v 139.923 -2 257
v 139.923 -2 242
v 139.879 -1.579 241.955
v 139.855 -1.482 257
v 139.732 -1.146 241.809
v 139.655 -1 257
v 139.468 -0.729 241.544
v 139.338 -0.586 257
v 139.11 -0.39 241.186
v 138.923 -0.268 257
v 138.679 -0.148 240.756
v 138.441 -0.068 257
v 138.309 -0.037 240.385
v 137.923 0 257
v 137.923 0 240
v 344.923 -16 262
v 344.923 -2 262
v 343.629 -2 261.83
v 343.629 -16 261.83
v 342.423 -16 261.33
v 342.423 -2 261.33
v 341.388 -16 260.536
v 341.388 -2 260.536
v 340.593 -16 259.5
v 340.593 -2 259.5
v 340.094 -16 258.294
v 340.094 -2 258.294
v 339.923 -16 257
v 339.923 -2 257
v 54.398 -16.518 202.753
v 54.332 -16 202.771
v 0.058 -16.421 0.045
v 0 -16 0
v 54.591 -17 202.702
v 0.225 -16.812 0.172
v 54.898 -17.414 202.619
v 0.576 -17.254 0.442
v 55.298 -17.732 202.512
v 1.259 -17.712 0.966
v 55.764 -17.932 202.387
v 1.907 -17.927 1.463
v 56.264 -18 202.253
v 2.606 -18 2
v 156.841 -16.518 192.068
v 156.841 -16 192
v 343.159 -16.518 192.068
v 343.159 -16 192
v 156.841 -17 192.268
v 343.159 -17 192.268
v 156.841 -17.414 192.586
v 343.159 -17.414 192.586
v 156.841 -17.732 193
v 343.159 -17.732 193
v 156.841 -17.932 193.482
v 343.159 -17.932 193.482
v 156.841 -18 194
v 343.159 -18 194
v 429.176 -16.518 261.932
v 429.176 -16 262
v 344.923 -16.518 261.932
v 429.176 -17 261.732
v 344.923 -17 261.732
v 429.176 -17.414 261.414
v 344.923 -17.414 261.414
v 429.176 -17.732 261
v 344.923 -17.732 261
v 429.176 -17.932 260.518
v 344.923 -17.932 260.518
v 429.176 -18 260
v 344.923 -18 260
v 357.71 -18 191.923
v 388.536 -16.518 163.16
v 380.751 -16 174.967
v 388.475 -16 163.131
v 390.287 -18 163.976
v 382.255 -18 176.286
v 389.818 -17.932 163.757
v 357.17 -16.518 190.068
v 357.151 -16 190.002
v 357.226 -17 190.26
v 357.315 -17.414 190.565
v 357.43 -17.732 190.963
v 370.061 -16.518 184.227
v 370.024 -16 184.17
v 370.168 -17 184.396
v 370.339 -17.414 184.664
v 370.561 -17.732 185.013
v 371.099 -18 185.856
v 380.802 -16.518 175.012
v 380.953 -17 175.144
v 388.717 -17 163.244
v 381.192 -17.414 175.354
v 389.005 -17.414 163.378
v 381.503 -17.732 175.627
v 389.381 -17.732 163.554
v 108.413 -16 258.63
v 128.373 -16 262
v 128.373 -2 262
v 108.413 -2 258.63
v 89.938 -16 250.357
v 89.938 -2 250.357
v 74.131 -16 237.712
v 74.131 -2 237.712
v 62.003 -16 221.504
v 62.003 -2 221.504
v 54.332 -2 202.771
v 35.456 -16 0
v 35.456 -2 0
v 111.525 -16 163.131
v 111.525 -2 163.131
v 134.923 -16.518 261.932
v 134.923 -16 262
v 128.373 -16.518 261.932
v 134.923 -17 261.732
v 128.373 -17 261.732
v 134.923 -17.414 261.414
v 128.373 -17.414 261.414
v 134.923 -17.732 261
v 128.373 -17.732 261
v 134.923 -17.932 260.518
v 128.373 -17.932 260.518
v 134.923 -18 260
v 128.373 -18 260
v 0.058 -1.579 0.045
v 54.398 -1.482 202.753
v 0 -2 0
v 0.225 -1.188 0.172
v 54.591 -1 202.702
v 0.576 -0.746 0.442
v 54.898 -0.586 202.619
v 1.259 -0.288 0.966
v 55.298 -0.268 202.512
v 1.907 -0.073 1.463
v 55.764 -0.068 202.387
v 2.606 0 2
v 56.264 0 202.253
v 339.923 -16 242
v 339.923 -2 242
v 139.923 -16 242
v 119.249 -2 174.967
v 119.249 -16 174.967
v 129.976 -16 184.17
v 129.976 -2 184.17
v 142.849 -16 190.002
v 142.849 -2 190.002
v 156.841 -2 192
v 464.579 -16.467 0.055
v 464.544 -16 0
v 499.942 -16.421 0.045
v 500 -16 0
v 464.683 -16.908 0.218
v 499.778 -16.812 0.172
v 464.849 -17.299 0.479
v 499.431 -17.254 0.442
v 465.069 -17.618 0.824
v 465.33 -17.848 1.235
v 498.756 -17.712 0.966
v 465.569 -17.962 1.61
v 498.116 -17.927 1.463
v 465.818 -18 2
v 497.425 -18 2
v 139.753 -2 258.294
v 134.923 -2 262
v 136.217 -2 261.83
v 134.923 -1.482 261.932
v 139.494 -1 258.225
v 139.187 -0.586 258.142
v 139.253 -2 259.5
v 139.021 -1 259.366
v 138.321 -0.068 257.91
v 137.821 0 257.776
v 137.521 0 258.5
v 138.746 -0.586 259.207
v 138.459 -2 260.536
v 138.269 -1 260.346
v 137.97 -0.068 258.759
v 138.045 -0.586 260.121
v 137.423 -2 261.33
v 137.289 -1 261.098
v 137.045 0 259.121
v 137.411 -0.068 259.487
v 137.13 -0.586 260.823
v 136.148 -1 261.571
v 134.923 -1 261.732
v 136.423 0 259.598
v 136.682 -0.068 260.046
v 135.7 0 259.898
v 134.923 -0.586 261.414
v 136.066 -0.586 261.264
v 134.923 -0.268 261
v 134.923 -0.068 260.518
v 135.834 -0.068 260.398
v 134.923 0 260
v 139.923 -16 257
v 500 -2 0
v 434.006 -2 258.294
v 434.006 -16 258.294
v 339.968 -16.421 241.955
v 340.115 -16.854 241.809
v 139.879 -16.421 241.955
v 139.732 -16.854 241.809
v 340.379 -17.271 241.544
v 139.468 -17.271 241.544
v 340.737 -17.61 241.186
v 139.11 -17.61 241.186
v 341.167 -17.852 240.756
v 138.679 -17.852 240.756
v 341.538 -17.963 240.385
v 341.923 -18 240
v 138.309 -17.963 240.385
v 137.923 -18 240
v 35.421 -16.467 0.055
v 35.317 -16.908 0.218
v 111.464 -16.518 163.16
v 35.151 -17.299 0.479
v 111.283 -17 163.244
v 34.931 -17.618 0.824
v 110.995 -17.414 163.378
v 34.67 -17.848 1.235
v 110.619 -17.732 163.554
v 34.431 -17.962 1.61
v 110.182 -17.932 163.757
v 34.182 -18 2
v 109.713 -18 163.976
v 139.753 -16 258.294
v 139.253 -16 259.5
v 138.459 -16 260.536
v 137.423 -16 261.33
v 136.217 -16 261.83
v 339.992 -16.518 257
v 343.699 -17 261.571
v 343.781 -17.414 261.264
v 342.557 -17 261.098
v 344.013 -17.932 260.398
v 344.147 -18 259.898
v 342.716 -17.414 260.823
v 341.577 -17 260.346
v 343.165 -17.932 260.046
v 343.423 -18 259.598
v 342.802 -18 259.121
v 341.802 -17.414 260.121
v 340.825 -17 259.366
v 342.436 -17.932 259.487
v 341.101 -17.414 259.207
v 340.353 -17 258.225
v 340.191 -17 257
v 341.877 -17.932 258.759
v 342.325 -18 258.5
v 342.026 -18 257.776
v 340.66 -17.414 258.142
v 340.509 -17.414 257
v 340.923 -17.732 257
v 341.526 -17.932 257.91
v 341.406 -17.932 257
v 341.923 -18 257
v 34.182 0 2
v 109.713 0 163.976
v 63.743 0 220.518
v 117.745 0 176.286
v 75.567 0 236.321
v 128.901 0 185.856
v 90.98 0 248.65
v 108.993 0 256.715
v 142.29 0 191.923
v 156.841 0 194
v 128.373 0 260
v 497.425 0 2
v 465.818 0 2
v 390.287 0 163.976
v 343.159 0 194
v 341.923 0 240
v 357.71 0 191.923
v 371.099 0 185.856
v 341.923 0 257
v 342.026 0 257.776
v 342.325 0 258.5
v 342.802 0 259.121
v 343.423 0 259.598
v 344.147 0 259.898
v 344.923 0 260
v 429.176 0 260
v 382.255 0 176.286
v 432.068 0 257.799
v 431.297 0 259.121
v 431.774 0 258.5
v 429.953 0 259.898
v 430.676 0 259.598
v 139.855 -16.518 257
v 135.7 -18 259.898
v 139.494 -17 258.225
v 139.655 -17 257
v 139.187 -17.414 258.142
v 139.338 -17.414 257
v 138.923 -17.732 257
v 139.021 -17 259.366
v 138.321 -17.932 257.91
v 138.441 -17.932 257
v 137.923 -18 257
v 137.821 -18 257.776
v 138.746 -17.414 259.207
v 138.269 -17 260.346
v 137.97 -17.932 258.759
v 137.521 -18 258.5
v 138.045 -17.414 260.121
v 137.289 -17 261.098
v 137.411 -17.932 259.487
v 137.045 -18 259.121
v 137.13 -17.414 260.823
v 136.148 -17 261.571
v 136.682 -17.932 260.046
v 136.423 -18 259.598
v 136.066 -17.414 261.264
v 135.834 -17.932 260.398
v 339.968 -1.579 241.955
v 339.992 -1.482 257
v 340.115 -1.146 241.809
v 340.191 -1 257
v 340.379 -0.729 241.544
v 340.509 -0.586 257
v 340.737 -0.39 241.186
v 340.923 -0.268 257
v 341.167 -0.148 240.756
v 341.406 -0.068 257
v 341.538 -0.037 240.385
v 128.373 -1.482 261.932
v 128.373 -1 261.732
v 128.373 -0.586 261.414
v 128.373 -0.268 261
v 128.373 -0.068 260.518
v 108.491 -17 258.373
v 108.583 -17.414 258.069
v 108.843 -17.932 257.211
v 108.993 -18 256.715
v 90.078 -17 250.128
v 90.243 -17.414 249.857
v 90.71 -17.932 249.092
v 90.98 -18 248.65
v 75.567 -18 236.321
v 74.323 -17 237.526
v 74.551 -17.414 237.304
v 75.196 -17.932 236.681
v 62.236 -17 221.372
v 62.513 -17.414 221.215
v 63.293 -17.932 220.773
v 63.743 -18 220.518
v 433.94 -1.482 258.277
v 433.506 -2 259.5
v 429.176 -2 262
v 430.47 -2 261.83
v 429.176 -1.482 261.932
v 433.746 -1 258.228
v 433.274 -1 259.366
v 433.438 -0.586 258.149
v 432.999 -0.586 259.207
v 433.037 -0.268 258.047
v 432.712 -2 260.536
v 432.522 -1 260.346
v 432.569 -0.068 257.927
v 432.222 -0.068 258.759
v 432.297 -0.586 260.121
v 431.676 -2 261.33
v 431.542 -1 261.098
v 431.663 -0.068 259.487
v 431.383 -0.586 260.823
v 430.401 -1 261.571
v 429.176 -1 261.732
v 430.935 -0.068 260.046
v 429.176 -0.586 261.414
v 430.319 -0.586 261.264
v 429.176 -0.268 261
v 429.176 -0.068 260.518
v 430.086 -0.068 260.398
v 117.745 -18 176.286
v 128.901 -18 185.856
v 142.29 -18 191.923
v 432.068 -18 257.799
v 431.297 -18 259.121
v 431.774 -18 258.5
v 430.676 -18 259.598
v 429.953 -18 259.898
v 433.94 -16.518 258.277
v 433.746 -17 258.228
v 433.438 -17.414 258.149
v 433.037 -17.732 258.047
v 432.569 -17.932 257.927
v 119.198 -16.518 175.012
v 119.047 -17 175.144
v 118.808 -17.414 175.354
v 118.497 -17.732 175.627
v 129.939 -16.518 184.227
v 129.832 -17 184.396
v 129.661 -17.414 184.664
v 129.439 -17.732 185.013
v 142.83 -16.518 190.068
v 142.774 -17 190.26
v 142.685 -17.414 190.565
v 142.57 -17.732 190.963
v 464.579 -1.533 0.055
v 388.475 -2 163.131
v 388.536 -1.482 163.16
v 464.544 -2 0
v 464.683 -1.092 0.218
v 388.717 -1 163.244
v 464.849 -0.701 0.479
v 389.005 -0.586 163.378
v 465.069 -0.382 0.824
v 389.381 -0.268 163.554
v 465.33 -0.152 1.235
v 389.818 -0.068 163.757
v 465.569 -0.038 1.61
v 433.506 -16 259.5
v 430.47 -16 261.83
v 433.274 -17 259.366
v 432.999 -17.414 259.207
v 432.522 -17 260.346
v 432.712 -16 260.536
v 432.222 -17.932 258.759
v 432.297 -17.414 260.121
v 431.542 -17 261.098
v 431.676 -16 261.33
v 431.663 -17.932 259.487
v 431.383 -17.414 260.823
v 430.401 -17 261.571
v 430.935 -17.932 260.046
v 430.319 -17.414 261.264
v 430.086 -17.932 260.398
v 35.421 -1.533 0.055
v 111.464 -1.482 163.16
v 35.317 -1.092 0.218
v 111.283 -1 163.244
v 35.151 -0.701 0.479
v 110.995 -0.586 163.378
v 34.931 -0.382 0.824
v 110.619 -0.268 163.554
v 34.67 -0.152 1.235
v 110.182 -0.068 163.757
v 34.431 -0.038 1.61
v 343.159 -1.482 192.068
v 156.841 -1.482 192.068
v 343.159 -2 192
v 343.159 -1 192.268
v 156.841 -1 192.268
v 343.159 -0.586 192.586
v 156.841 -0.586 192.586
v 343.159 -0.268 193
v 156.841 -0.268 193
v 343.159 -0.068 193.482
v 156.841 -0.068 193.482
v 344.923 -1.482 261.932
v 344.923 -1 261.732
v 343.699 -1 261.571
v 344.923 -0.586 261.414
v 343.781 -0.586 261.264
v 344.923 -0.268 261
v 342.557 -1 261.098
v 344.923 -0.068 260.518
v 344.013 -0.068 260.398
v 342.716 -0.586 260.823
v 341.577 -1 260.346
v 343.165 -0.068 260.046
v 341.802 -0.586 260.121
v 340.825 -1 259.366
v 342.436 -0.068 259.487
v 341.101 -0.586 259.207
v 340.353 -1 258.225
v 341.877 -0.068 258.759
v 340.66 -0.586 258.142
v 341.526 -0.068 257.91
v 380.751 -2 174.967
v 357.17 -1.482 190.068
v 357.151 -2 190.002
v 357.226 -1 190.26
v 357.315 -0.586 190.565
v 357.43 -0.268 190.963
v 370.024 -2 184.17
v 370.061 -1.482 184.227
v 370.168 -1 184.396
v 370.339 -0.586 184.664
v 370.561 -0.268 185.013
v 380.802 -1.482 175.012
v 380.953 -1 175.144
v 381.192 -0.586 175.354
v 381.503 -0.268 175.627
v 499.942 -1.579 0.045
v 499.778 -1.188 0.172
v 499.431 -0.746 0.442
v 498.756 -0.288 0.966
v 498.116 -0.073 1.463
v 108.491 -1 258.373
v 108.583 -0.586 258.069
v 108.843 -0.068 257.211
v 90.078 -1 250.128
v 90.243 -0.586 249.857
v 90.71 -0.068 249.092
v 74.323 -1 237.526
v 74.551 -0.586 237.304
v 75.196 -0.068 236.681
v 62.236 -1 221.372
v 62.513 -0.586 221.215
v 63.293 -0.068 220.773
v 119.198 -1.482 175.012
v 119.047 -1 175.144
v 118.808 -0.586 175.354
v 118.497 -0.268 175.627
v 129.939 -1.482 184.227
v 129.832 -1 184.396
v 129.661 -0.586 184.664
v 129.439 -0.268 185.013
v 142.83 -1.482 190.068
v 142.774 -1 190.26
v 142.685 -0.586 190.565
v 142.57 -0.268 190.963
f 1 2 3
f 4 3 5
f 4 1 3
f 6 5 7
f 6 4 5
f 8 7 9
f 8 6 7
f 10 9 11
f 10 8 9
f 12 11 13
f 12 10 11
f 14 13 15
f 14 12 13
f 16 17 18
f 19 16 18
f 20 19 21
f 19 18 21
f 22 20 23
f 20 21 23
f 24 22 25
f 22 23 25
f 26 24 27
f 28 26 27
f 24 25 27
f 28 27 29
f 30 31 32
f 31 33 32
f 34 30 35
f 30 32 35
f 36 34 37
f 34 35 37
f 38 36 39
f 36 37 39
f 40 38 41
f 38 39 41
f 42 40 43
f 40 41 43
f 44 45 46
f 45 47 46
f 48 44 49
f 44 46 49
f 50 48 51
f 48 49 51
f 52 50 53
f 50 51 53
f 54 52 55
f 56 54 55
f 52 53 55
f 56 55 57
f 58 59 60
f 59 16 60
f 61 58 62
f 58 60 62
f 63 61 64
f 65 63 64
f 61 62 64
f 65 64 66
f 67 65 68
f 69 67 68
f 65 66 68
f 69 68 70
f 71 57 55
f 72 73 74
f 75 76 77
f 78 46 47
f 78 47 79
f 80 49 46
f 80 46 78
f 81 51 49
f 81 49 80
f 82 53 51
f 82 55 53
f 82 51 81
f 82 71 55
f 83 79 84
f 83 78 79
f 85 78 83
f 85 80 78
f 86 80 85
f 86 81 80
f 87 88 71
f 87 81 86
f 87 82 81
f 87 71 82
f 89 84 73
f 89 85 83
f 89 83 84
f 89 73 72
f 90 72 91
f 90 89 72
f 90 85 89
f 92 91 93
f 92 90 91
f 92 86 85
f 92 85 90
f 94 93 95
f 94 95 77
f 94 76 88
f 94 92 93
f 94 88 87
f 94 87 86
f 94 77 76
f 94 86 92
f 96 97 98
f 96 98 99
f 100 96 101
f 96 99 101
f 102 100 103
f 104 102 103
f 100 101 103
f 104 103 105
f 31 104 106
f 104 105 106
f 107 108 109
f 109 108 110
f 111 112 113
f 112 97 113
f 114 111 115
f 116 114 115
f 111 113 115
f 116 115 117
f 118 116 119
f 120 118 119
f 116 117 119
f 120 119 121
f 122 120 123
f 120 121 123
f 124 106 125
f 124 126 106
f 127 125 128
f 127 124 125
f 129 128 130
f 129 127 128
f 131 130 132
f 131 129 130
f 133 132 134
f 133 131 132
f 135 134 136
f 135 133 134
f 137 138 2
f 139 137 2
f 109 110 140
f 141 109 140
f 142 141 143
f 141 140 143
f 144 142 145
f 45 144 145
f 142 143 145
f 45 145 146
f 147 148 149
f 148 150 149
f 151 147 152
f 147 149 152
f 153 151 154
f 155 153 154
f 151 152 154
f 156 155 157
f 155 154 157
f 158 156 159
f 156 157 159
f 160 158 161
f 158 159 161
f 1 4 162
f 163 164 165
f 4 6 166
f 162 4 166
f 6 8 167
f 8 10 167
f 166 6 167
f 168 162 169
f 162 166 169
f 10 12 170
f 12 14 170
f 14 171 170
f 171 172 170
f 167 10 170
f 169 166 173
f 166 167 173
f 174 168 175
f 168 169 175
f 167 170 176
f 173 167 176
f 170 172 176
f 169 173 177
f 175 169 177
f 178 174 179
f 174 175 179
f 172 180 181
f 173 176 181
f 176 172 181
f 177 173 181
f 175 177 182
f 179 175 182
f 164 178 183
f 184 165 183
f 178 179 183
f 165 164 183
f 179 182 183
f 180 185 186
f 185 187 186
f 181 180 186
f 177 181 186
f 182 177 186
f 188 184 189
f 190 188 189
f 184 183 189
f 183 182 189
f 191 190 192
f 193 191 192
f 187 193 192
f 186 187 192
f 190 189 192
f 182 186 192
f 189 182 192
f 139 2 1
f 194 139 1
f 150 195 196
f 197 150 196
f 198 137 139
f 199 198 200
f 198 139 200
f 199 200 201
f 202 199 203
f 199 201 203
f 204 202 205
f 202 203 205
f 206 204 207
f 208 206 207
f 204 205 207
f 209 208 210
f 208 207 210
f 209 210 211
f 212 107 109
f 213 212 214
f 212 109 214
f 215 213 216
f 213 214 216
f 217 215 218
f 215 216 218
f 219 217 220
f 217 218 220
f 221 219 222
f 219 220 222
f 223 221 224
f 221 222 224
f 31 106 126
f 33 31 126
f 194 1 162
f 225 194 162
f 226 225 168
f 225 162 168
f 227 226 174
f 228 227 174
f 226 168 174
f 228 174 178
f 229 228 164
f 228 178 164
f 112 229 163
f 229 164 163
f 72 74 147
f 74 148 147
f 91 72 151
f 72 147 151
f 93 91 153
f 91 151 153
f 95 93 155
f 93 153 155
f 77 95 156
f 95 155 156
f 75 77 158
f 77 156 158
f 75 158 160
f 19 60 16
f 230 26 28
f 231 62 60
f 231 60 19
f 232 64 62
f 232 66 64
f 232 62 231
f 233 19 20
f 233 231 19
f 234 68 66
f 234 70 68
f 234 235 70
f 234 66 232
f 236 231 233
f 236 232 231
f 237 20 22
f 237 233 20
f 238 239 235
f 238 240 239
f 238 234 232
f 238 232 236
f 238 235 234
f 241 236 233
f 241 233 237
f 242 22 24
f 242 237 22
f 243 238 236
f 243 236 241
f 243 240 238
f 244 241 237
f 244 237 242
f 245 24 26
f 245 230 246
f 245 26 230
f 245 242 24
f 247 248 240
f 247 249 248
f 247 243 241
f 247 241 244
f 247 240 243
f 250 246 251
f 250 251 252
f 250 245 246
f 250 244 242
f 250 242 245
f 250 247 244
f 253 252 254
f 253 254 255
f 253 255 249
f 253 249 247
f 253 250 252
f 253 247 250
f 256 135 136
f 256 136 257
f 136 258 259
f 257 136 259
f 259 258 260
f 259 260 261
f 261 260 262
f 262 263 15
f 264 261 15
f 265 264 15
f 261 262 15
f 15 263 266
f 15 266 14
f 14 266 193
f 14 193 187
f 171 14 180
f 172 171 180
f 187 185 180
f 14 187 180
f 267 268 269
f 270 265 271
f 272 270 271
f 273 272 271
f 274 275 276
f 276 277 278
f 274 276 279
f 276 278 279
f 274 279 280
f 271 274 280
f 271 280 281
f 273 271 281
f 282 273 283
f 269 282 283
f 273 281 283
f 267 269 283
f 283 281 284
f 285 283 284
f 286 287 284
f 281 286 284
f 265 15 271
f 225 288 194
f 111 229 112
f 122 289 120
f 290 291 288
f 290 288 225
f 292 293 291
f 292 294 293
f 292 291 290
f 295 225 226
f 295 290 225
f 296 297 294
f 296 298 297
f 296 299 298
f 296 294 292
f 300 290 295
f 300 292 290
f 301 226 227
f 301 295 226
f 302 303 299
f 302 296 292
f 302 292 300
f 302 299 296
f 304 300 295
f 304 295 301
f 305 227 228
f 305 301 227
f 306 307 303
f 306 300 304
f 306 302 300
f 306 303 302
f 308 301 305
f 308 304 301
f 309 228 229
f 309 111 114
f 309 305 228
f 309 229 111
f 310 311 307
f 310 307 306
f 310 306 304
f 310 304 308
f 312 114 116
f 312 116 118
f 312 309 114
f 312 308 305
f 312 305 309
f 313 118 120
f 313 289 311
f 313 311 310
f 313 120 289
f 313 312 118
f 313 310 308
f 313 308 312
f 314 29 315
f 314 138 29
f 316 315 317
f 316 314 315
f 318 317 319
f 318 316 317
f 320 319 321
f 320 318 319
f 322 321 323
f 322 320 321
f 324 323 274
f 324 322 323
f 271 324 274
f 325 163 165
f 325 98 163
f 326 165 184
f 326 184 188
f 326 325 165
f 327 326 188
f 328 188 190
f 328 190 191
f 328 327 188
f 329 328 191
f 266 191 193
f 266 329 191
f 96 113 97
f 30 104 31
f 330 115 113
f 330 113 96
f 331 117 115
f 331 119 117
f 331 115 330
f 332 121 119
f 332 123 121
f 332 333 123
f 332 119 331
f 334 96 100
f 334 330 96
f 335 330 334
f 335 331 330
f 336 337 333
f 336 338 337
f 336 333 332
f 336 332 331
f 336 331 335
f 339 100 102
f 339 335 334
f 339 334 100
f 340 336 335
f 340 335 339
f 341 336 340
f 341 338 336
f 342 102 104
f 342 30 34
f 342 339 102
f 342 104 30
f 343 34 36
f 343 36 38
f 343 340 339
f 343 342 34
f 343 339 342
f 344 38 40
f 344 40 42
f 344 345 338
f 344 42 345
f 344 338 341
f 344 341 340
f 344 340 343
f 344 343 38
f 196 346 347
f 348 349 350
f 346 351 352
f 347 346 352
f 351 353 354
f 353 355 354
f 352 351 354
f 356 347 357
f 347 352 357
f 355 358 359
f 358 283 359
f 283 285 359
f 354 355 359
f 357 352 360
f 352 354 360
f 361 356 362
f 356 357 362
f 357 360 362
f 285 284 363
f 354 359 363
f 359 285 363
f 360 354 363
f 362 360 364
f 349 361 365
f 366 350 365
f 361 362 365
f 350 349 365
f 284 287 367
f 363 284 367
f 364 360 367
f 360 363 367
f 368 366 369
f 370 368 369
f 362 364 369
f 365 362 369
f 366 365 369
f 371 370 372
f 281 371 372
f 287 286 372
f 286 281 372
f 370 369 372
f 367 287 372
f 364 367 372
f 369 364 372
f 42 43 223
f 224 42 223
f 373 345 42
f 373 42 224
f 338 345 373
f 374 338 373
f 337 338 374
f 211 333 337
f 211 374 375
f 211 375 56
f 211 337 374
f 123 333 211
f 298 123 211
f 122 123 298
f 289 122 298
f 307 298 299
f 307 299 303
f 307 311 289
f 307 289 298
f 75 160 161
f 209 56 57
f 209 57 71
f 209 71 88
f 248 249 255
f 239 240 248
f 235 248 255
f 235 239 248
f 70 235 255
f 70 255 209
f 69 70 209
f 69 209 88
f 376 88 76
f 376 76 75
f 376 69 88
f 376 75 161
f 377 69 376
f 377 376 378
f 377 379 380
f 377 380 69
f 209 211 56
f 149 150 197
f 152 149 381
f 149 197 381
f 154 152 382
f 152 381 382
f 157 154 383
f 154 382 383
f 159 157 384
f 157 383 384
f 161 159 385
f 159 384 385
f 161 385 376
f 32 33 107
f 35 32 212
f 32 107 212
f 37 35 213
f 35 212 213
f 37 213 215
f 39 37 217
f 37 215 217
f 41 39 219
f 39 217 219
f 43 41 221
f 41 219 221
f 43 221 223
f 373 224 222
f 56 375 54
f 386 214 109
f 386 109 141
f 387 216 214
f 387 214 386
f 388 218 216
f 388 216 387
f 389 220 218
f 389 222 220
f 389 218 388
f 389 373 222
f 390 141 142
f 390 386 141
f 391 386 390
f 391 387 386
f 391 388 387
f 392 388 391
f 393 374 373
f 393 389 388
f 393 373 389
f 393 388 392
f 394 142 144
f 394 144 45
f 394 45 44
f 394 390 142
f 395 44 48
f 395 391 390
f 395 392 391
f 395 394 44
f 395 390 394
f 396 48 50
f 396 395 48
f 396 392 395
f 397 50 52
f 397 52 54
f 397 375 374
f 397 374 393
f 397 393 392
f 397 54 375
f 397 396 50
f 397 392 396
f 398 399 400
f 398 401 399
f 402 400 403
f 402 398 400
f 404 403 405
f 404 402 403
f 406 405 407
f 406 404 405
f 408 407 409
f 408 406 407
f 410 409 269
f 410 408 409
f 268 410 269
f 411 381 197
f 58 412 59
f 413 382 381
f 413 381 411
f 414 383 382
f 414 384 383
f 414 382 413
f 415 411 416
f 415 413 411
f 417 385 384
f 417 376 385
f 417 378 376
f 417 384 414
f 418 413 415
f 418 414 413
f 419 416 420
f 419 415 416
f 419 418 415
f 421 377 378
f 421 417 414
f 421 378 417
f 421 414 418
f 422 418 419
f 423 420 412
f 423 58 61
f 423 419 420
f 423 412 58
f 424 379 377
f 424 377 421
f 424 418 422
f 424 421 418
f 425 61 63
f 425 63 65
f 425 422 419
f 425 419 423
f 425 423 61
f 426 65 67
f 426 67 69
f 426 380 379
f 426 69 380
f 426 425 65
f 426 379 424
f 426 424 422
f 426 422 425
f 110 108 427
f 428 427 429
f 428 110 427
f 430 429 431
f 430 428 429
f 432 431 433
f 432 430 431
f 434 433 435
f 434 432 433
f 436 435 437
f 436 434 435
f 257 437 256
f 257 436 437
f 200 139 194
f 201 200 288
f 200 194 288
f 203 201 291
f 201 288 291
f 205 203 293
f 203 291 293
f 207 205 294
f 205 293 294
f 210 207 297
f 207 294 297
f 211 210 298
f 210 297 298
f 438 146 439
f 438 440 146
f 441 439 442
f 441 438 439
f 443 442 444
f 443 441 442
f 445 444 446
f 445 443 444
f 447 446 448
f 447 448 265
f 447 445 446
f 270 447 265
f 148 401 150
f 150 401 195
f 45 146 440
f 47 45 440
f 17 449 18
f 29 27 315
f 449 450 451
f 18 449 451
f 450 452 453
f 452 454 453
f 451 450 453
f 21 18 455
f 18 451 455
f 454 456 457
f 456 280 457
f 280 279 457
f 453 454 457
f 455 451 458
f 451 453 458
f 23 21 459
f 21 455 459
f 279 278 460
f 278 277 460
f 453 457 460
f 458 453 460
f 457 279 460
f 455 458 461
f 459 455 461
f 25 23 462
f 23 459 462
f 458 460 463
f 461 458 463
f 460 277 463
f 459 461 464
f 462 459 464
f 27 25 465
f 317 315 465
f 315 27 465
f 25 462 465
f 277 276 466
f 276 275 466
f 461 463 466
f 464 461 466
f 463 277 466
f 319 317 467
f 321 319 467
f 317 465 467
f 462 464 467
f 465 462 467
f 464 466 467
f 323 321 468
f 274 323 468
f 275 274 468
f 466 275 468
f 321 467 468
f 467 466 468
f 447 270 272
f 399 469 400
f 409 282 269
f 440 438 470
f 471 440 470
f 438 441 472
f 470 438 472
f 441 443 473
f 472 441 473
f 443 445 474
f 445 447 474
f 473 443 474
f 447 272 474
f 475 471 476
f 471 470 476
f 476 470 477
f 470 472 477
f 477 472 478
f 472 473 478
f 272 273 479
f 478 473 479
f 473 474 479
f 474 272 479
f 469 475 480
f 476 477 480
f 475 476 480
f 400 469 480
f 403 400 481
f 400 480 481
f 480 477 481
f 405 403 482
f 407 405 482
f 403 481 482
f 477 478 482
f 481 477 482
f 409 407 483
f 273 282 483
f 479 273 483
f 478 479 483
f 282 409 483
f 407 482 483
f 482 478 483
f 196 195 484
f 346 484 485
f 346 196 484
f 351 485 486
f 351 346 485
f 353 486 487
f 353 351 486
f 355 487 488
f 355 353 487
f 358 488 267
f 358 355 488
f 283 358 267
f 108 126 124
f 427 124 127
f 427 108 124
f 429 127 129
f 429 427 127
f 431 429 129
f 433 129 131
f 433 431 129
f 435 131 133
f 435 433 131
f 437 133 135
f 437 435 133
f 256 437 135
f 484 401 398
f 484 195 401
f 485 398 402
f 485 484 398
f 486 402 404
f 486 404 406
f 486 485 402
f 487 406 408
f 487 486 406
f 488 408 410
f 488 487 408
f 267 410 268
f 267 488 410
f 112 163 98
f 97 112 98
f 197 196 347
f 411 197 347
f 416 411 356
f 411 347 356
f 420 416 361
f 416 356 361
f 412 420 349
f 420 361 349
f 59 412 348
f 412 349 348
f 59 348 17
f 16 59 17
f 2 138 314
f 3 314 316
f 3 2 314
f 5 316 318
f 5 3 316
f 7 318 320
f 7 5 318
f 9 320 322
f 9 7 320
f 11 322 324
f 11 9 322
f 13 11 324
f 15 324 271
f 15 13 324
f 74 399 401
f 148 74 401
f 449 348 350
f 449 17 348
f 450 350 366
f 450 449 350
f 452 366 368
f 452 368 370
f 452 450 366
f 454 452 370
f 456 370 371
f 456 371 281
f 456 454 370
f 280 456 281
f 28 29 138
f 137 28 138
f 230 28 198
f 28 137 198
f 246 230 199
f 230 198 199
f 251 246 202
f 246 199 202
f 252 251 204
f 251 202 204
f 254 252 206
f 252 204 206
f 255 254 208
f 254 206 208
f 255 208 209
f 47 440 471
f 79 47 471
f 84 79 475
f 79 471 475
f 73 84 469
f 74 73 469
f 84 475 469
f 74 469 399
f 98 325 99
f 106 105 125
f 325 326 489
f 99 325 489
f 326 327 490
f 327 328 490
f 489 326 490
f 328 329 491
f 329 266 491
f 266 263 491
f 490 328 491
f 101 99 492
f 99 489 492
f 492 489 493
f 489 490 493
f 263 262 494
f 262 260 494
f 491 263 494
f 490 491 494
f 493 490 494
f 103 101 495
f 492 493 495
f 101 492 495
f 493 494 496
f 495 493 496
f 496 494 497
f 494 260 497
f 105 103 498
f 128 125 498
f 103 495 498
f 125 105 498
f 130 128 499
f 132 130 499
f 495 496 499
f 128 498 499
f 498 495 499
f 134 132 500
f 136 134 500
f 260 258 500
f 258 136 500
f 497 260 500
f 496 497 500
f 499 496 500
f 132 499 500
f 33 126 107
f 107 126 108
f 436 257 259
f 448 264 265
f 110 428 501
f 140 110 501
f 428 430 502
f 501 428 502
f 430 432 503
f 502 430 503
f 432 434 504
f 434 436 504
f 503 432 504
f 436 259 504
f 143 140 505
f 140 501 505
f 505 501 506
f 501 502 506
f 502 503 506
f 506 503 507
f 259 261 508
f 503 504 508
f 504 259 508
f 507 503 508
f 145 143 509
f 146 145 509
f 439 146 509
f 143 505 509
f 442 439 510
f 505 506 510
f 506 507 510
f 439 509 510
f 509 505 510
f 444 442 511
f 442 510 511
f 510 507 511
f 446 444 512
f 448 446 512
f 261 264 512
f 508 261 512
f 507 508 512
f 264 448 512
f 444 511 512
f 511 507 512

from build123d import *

# Parameters (mm, degrees)
F1_DEPTH = 18
F2_R     = 2


with BuildPart() as f1:
    # F0 (on Front) → F1 (new body)
    with BuildSketch(Plane.XZ):
        with BuildLine():
            Line((54.3322916932, 202.7708730905), (0, 0))
            Line((0, 0), (35.456227742, 0))
            Line((35.456227742, 0), (111.5254217963, 163.130913087))
            ThreePointArc((111.5254217963, 163.130913087), (129.9758307308, 184.1695722906), (156.8408111482, 192))
            Line((156.8408111482, 192), (343.1591888518, 192))
            ThreePointArc((343.1591888518, 192), (370.0241692692, 184.1695722906), (388.4745782037, 163.130913087))
            Line((388.4745782037, 163.130913087), (464.543772258, 0))
            Line((464.543772258, 0), (500, 0))
            Line((500, 0), (434.0056960838, 258.2940952255))
            ThreePointArc((434.0056960838, 258.2940952255), (432.2198740974, 260.9667667015), (429.1760669523, 262))
            Line((429.1760669523, 262), (371.6265428539, 262))
            Line((371.6265428539, 262), (344.9233630828, 262))
            ThreePointArc((344.9233630828, 262), (341.3878291768, 260.5355339059), (339.9233630828, 257))
            Line((339.9233630828, 257), (339.9233630828, 242))
            Line((339.9233630828, 242), (139.9233630828, 242))
            Line((139.9233630828, 242), (139.9233630828, 257))
            ThreePointArc((139.9233630828, 257), (138.4588969887, 260.5355339059), (134.9233630828, 262))
            Line((134.9233630828, 262), (128.3734571461, 262))
            ThreePointArc((128.3734571461, 262), (81.6327118159, 244.5364204466), (54.3322916932, 202.7708730905))
        make_face()
    extrude(amount=F1_DEPTH)

    # F2
    f2_edges = [f1.edges().sort_by_distance(p)[0] for p in [
        (339.923363, -18, 249.5),
        (239.923363, -18, 242),
        (139.923363, -18, 249.5),
        (138.458897, -18, 260.535534),
        (131.64841, -18, 262),
        (81.632712, -18, 244.53642),
        (27.166146, -18, 101.385437),
        (17.728114, -18, 0),
        (73.490825, -18, 81.565457),
        (129.975831, -18, 184.169572),
        (250, -18, 192),
        (370.024169, -18, 184.169572),
        (426.509175, -18, 81.565457),
        (482.271886, -18, 0),
        (467.002848, -18, 129.147048),
        (432.219874, -18, 260.966767),
        (387.049715, -18, 262),
        (341.387829, -18, 260.535534),
        (339.923363, 0, 249.5),
        (239.923363, 0, 242),
        (139.923363, 0, 249.5),
        (138.458897, 0, 260.535534),
        (131.64841, 0, 262),
        (81.632712, 0, 244.53642),
        (27.166146, 0, 101.385437),
        (17.728114, 0, 0),
        (73.490825, 0, 81.565457),
        (129.975831, 0, 184.169572),
        (250, 0, 192),
        (370.024169, 0, 184.169572),
        (426.509175, 0, 81.565457),
        (482.271886, 0, 0),
        (467.002848, 0, 129.147048),
        (432.219874, 0, 260.966767),
        (387.049715, 0, 262),
        (341.387829, 0, 260.535534),
    ]]
    fillet(f2_edges, radius=F2_R)


solid = f1.part
